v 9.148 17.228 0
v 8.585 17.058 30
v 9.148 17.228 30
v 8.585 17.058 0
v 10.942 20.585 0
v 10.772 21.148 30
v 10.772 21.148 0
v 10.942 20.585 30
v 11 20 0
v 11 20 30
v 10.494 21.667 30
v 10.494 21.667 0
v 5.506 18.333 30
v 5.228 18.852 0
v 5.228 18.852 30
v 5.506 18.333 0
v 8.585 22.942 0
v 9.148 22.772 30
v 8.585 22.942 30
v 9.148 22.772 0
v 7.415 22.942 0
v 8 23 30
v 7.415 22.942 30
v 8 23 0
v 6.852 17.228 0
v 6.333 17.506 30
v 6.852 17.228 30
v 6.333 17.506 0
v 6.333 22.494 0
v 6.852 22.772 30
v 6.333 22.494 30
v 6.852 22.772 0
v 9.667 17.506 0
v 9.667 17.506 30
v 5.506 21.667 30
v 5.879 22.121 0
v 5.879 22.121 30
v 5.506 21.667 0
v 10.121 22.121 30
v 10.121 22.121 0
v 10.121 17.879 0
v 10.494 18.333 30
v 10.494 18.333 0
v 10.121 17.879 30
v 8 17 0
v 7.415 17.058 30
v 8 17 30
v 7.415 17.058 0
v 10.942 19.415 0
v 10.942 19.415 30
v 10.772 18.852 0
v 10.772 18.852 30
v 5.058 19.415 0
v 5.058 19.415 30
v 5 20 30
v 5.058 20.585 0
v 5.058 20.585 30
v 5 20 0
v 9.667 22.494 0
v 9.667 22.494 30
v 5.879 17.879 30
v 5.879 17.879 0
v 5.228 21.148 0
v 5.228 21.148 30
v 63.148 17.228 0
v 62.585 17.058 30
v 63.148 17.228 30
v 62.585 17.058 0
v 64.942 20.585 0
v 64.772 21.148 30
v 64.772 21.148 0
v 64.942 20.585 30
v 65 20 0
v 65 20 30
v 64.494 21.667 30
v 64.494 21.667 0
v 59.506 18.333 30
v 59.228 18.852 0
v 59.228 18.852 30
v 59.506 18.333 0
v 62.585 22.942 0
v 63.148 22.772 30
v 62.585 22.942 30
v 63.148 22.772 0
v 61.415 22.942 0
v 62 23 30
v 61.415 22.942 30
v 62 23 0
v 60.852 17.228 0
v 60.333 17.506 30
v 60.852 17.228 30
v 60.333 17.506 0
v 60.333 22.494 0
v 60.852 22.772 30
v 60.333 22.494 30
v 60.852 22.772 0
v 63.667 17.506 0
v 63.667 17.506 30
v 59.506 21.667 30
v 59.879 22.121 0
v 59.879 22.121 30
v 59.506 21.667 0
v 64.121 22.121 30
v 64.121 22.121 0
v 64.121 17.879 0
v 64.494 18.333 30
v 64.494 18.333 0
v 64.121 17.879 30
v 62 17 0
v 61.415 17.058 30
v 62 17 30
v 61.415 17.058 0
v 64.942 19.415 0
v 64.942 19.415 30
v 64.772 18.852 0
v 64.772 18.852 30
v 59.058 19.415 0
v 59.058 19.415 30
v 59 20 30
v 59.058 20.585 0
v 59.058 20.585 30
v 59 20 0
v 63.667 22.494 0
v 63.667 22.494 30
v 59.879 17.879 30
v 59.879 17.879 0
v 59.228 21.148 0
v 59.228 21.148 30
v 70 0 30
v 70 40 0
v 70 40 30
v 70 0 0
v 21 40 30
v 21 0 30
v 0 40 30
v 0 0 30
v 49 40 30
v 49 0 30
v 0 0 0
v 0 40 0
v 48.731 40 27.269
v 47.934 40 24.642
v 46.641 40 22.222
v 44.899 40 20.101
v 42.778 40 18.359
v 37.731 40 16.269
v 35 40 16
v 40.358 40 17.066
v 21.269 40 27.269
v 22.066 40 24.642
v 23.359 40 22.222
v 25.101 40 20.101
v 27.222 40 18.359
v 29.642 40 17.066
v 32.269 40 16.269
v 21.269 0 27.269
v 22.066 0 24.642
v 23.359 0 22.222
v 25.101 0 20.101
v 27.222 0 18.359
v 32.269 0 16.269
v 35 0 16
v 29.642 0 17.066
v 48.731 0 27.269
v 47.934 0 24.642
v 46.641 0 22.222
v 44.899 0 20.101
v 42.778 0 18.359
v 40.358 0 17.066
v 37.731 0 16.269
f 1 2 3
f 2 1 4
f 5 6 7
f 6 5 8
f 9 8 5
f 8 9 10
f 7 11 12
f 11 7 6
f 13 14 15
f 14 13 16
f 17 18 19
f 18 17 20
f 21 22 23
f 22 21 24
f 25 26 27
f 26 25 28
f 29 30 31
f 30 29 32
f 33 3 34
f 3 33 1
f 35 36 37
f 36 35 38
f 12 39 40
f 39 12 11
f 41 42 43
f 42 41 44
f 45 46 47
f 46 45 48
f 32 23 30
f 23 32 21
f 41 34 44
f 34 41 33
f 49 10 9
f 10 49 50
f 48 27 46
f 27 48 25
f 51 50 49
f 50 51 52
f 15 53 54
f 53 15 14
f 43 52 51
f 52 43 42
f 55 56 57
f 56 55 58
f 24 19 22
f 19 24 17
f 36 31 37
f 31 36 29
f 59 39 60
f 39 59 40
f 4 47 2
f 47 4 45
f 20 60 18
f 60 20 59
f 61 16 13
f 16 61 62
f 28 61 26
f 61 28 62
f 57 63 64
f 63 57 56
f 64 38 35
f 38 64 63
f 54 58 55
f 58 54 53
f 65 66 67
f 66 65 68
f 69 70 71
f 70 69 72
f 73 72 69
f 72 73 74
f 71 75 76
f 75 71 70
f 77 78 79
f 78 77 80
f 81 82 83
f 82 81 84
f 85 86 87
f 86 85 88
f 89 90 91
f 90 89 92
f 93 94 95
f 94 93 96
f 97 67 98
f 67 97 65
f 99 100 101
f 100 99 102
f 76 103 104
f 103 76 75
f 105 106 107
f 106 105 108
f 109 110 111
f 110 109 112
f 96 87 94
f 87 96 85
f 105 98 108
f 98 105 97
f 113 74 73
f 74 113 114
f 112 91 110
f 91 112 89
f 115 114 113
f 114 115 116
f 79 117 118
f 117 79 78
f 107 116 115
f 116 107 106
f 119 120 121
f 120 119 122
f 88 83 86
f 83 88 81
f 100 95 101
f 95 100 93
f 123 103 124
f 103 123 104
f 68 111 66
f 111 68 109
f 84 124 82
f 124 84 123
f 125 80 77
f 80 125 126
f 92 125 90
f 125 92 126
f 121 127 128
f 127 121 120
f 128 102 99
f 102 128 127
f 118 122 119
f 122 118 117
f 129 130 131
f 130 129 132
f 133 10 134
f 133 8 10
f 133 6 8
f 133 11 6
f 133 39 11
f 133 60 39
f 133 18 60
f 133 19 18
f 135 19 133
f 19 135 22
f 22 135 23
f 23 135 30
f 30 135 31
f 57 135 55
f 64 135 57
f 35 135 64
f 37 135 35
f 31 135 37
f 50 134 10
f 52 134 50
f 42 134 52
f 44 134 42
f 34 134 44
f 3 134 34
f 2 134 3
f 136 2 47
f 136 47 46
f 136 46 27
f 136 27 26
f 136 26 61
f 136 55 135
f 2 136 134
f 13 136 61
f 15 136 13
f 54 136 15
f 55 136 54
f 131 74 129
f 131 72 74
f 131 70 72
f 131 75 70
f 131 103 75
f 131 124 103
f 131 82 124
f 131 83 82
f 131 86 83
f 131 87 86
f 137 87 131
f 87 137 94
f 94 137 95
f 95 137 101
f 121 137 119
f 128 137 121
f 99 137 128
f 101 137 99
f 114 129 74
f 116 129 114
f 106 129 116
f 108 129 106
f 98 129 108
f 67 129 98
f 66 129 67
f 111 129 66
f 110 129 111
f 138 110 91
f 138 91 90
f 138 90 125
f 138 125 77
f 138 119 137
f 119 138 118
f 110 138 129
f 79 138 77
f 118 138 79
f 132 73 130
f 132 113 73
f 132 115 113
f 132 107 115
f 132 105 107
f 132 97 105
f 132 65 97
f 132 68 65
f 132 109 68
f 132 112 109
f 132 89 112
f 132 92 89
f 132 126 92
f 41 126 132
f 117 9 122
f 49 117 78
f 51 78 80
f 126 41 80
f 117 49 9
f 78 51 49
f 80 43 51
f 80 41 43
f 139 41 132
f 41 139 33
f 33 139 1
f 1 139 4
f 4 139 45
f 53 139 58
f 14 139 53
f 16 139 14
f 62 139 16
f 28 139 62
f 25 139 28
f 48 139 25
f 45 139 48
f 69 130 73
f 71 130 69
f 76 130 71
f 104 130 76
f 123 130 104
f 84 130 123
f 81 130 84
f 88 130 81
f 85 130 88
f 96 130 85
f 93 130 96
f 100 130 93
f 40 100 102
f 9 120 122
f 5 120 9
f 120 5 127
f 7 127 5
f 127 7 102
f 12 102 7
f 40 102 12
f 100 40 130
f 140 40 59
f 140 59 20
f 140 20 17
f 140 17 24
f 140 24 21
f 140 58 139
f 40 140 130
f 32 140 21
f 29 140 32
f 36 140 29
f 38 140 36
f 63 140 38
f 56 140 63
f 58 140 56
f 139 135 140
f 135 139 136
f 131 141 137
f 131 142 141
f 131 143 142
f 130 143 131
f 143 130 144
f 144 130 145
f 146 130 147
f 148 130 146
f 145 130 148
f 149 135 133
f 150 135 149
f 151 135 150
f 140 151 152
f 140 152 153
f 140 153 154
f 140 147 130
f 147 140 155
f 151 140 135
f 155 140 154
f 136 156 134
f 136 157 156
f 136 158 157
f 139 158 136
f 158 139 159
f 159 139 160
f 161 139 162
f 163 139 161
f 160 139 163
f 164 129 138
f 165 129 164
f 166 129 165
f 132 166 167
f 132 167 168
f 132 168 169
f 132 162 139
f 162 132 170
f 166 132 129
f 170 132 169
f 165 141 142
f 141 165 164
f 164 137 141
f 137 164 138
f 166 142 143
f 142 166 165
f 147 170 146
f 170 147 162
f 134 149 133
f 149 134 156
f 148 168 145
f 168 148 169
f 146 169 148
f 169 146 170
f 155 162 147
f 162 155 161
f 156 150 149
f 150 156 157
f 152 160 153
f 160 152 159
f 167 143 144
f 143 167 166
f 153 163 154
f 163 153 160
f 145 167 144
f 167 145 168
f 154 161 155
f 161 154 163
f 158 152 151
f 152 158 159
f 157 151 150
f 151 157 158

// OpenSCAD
$fn = 32;

// ----------------------------------------------------------------------
// Saddle clamp: plain shaft clamp
// ----------------------------------------------------------------------

// --- parameters (mm) ---
blk_l = 70;               // block length, X
blk_w = 40;               // block width, Y
blk_h = 30;               // block height
clamp_r = 14;             // shaft groove radius
hole_r = 3;               // bolt hole radius
hole_m = 8;               // bolt hole margin from the ends

saw_depth = clamp_r + 3;  // saw kerf depth

difference() {
  cube([blk_l, blk_w, blk_h]);
  translate([blk_l / 2, -1, blk_h])
    rotate([-90, 0, 0])
      cylinder(h = blk_w + 2, r = clamp_r);
  for (sx = [0, 1])
    translate([sx ? blk_l - hole_m : hole_m, blk_w / 2, -1])
      cylinder(r = hole_r, h = blk_h + 2);
}
